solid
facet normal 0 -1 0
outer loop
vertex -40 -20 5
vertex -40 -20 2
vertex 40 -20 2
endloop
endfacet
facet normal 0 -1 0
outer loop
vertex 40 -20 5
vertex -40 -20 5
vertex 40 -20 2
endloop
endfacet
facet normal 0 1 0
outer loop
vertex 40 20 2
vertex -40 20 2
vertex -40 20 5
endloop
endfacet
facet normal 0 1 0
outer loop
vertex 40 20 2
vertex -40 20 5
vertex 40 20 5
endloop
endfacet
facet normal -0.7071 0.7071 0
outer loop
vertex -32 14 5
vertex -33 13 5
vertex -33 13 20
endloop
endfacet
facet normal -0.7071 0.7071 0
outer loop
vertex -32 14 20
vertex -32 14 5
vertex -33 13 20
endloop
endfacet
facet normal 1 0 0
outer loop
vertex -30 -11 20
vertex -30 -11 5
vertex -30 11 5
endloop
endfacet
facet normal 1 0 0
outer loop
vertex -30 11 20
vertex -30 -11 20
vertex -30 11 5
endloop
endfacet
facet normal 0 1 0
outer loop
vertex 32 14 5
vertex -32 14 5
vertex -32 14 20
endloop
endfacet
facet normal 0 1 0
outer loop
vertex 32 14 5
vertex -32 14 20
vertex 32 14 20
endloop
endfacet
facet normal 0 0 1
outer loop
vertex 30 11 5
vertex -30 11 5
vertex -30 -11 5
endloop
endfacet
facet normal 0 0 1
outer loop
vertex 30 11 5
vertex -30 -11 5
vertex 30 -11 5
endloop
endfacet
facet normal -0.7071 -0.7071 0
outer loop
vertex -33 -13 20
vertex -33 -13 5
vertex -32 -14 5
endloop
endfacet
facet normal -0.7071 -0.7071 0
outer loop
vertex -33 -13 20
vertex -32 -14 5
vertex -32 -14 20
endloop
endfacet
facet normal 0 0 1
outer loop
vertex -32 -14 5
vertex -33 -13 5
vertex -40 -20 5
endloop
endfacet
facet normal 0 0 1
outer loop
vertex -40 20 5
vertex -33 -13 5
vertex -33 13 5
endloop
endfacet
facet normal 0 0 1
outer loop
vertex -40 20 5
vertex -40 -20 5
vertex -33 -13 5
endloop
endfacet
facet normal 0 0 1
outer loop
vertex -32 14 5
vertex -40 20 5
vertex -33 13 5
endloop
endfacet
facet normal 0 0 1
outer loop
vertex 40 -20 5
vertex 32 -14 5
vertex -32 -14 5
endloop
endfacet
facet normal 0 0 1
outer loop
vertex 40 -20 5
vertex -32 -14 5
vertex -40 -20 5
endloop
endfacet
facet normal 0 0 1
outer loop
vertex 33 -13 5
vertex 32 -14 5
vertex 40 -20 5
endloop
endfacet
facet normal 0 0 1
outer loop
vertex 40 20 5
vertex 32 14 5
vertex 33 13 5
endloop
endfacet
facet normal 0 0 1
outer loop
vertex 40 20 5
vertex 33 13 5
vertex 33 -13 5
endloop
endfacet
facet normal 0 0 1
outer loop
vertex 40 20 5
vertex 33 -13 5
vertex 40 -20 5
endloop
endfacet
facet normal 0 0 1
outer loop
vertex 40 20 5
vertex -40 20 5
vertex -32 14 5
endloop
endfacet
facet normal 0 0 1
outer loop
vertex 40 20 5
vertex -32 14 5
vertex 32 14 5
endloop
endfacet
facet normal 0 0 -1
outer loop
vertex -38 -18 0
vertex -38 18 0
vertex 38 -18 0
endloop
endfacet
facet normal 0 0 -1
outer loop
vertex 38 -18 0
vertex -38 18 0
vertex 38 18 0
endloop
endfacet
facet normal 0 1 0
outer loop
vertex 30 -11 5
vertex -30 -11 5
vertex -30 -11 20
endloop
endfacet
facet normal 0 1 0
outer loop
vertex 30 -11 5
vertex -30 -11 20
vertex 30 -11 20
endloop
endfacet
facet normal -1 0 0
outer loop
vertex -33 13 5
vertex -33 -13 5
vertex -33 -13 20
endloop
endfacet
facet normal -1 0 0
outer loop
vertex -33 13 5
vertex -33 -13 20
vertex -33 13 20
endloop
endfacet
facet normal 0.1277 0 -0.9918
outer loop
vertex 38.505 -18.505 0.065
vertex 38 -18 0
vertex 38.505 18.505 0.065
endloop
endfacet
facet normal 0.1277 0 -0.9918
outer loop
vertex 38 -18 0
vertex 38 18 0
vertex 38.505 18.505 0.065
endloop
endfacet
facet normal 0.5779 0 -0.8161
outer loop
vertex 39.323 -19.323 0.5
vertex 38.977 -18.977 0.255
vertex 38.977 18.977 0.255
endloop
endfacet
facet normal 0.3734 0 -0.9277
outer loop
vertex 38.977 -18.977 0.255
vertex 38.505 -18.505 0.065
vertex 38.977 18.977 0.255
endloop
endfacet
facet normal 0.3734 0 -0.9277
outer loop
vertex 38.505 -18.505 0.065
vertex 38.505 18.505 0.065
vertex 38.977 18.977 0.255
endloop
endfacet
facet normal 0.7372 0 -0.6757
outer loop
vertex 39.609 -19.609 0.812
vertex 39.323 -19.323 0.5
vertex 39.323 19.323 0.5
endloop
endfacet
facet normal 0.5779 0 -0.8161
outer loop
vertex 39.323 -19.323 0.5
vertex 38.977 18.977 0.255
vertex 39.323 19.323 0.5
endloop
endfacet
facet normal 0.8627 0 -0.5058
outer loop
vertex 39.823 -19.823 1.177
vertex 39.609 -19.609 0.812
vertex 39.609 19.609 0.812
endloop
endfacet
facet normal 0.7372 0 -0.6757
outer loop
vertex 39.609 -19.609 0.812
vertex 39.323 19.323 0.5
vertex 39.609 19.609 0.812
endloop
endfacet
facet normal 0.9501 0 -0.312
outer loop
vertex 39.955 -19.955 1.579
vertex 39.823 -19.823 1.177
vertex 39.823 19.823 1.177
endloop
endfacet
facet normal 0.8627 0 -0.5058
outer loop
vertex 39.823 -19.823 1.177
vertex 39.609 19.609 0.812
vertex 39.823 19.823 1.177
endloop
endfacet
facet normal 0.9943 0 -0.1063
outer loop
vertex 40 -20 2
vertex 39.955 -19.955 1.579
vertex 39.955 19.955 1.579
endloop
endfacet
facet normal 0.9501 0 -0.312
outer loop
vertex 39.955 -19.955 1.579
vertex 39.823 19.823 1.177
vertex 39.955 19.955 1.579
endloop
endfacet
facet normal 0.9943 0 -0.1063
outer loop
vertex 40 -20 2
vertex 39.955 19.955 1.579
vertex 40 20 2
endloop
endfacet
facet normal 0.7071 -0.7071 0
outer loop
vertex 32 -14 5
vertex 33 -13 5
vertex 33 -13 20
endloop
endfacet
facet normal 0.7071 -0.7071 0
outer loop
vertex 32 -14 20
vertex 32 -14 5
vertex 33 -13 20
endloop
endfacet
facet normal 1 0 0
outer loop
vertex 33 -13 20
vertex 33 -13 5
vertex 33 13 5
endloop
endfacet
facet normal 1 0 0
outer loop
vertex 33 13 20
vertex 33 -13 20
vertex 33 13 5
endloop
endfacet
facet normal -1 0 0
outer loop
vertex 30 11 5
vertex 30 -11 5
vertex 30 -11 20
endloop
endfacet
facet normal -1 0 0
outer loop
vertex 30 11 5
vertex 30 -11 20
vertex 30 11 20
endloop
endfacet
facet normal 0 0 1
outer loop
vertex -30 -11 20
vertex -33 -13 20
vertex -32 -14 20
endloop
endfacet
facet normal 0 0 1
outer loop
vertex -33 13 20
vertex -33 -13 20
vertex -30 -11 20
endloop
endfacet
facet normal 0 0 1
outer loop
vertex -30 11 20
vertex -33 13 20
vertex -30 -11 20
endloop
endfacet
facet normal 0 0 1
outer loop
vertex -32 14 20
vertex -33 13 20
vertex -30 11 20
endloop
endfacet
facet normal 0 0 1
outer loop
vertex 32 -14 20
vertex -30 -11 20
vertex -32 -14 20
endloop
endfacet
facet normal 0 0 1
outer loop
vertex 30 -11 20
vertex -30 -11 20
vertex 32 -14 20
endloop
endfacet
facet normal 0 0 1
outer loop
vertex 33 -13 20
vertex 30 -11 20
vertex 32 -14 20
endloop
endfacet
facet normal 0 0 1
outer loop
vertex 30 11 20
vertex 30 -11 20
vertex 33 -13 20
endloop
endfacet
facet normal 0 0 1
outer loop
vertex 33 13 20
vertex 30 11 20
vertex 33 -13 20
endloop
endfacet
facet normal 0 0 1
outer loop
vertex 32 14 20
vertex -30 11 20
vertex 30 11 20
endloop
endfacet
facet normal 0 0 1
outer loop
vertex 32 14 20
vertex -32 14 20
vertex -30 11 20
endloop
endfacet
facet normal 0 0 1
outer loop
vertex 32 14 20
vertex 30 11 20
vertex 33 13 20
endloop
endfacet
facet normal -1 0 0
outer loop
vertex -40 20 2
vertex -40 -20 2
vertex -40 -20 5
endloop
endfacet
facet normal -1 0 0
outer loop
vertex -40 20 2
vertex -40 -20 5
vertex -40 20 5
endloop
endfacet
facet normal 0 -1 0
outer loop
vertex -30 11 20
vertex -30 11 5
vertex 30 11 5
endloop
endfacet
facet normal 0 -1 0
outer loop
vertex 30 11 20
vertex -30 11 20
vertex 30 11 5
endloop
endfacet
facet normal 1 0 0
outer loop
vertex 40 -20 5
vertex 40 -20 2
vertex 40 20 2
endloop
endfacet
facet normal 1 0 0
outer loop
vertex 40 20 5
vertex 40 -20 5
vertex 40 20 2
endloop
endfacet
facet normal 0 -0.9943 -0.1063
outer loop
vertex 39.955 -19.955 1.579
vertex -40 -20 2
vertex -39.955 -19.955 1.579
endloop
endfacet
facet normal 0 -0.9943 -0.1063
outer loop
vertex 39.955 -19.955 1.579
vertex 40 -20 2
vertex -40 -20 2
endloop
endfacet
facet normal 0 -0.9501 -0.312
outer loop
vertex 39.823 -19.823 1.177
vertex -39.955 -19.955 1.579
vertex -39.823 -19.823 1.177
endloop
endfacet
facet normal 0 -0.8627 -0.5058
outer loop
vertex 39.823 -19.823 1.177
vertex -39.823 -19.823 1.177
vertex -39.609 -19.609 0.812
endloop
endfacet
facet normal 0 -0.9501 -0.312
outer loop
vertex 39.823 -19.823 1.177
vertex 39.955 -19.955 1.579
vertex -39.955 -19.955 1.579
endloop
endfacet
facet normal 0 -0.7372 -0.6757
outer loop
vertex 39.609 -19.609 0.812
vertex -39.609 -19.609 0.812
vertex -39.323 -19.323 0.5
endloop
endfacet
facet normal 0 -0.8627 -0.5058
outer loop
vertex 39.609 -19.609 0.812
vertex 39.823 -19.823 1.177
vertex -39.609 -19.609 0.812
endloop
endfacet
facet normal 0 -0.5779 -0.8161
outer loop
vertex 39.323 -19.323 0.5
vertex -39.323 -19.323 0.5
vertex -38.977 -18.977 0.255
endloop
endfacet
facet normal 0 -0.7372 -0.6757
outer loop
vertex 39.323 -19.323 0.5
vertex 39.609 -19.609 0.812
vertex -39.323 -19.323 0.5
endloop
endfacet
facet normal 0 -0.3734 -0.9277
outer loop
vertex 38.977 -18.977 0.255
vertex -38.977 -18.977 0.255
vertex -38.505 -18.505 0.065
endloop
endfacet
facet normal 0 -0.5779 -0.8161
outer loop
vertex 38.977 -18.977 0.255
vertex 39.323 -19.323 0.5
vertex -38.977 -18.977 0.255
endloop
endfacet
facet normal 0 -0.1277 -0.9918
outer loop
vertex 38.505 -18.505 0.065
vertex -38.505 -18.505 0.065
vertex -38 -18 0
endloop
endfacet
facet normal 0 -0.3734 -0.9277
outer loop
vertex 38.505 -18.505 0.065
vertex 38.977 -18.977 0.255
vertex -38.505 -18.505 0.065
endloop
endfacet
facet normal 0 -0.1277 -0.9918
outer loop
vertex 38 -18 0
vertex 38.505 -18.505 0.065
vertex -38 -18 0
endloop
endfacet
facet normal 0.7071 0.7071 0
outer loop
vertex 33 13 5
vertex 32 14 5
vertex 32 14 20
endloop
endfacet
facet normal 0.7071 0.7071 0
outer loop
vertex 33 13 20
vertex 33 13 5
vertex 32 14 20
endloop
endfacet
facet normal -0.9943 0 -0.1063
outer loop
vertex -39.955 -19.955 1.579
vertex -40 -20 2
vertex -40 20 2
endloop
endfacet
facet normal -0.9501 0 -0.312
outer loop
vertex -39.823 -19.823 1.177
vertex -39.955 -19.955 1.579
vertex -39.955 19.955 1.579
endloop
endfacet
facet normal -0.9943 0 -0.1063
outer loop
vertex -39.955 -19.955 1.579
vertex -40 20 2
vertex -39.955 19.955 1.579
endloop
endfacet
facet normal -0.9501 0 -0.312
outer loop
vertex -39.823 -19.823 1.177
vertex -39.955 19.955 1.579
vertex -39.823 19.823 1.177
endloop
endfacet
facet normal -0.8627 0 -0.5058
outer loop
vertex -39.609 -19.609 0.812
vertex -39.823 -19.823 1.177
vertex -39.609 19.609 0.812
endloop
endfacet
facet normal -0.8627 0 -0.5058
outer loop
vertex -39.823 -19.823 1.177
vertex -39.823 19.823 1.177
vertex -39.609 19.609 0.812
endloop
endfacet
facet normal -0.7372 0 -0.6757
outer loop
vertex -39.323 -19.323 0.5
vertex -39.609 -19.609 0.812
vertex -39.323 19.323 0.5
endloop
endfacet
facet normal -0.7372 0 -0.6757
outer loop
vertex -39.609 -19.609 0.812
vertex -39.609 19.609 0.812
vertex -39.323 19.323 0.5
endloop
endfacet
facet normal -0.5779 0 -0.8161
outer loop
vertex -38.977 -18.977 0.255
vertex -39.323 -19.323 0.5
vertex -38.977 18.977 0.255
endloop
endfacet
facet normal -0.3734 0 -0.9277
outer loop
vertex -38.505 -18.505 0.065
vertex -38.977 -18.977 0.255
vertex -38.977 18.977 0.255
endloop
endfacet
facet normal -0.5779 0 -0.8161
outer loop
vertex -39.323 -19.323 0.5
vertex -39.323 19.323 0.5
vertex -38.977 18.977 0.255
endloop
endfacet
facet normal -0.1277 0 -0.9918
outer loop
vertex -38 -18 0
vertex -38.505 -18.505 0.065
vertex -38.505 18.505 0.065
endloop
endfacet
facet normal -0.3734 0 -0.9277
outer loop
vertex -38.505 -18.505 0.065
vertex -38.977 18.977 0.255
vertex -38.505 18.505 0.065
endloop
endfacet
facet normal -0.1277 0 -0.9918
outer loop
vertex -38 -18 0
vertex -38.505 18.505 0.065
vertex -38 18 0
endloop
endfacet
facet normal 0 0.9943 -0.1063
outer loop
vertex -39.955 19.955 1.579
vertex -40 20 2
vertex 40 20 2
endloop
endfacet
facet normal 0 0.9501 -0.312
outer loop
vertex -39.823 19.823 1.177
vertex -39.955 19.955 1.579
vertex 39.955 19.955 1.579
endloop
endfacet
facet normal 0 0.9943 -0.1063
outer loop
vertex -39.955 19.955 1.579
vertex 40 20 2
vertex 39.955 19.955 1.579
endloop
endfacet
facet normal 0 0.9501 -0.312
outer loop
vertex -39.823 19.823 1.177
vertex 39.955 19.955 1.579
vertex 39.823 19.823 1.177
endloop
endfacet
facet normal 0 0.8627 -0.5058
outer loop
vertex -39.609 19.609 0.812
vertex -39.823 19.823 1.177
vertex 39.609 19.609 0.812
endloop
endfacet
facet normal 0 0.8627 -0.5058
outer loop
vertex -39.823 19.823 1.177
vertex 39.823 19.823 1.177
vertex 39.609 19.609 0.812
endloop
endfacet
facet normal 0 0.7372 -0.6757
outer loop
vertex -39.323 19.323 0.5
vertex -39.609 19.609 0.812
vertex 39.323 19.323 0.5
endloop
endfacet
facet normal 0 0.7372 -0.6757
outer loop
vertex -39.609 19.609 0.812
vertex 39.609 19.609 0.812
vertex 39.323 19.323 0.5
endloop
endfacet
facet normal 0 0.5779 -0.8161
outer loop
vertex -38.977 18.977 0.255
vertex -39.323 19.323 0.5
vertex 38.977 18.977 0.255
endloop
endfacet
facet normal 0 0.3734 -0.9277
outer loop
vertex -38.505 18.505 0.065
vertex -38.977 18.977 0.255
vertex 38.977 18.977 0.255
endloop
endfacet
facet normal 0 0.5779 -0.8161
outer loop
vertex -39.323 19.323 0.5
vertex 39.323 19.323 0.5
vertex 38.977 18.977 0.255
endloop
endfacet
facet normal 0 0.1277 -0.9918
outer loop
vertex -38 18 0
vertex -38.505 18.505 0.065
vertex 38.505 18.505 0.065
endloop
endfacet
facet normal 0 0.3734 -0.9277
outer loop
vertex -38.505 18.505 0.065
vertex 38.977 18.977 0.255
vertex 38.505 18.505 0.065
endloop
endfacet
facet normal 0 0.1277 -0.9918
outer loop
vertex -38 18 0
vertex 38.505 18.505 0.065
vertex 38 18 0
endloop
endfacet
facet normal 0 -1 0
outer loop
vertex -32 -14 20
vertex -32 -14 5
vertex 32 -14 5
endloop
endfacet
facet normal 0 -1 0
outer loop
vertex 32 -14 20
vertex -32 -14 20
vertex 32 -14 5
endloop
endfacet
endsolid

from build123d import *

# Parameters (mm, degrees)
F0_W     = 80
F0_H     = 40
F1_DEPTH = 5
F2_W     = 66
F2_H     = 28
F2_W_2   = 60
F2_H_2   = 22
F3_DEPTH = 15
F4_R     = 2
F5_SIZE  = 1


with BuildPart() as f1:
    # F0 (on Top) → F1 (new body)
    with BuildSketch(Plane.XY):
        Rectangle(F0_W, F0_H)
    extrude(amount=F1_DEPTH)

    # F2 (on face) → F3 (join)
    with BuildSketch(Plane.XY.offset(5)):
        Rectangle(F2_W, F2_H)
        Rectangle(F2_W_2, F2_H_2, mode=Mode.SUBTRACT)
    extrude(amount=F3_DEPTH)

    # F4
    f4_edges = [f1.edges().sort_by_distance(p)[0] for p in [
        (0, -20, 0),
        (-40, 0, 0),
        (0, 20, 0),
        (40, 0, 0),
    ]]
    fillet(f4_edges, radius=F4_R)

    # F5
    f5_edges = [f1.edges().sort_by_distance(p)[0] for p in [
        (-33, -14, 12.5),
        (-33, 14, 12.5),
        (33, -14, 12.5),
        (33, 14, 12.5),
    ]]
    chamfer(f5_edges, length=F5_SIZE)


solid = f1.part
